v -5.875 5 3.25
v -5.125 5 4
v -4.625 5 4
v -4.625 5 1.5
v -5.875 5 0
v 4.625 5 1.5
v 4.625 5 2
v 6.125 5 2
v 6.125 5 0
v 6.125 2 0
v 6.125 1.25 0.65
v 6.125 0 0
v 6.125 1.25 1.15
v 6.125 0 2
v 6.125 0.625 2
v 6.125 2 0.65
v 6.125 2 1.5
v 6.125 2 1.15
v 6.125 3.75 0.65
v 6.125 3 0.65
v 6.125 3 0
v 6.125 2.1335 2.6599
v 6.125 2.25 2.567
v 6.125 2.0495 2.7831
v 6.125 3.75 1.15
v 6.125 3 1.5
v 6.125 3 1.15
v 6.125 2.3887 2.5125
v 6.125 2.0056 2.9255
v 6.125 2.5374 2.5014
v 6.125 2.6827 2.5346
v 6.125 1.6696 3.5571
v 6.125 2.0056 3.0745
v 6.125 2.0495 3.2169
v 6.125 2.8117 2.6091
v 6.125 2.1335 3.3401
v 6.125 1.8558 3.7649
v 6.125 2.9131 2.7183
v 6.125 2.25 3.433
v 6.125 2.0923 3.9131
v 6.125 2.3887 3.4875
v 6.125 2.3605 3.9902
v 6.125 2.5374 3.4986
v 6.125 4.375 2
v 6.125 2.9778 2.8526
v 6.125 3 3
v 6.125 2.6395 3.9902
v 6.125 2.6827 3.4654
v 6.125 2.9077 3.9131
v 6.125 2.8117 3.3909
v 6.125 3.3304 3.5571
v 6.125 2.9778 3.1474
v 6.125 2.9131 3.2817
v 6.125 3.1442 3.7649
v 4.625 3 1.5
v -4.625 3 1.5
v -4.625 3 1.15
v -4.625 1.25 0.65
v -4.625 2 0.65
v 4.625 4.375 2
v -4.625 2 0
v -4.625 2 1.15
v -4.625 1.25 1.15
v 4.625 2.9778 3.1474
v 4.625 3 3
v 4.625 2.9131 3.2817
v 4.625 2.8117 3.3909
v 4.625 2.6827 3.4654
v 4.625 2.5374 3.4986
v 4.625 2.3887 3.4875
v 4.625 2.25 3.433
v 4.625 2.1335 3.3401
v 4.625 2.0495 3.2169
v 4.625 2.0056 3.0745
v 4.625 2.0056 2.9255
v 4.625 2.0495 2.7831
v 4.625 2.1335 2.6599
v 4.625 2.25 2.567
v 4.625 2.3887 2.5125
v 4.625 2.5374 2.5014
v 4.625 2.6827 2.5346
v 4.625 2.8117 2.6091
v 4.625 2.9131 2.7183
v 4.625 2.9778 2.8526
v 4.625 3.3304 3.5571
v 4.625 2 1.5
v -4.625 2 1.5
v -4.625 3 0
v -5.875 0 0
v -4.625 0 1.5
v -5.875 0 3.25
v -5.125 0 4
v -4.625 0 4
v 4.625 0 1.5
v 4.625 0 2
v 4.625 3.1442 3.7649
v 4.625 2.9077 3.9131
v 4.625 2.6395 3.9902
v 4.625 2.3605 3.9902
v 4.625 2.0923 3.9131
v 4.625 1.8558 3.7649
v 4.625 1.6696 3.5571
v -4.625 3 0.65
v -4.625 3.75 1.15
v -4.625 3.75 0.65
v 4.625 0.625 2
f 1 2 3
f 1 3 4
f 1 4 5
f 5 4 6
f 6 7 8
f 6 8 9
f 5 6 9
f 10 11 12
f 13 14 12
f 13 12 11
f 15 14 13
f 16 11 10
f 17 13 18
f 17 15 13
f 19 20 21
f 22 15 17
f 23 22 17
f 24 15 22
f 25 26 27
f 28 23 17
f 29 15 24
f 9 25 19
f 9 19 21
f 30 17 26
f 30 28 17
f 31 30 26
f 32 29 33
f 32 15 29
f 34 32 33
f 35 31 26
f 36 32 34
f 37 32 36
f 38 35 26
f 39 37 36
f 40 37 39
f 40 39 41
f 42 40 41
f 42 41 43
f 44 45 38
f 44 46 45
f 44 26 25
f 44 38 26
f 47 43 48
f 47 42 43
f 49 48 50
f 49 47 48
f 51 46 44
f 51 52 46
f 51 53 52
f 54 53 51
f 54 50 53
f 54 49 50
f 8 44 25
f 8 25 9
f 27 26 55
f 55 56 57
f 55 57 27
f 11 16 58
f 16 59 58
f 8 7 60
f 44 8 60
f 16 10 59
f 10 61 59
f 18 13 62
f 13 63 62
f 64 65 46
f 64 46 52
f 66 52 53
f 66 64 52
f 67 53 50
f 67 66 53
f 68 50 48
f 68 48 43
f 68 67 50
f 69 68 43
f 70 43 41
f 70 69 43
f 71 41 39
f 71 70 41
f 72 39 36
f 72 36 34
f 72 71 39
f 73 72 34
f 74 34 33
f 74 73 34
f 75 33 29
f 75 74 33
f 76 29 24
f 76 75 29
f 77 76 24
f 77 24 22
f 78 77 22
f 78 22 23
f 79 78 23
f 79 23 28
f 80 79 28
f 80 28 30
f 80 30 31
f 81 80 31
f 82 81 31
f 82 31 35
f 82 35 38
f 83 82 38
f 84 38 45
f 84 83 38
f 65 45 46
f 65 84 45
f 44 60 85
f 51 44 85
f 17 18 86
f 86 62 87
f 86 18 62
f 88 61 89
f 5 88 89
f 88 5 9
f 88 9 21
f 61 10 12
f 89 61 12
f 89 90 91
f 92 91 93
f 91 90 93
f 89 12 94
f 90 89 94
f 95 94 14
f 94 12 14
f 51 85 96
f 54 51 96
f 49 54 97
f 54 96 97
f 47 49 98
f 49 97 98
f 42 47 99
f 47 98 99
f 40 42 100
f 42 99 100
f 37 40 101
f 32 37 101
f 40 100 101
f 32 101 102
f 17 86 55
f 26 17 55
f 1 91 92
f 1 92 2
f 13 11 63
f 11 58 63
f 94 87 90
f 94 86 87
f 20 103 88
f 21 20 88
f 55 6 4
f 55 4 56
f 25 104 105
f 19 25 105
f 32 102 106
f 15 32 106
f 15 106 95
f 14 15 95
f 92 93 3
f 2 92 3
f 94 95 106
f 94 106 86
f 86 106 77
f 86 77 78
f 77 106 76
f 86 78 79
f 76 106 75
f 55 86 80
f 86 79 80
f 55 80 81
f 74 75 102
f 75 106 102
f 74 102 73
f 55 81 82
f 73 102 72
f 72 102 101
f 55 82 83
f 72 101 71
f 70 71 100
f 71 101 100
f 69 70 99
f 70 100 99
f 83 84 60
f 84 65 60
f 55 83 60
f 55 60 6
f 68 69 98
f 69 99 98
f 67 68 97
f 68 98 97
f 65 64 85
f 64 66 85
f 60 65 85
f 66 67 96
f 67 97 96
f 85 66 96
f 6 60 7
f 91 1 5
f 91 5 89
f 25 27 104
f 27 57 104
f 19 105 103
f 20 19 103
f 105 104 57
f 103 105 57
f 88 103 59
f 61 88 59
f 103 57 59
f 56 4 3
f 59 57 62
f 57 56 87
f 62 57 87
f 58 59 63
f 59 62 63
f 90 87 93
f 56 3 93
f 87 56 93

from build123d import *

# Parameters (mm, degrees)
F1_DEPTH = 4.625
F2_R     = 0.5
F3_DEPTH = 1.5
F5_DEPTH = 1.25
F6_SIZE2 = 0.75
F6_SIZE  = 0.75


with BuildPart() as f1:
    # F0 (on Right) → F1 (new body, symmetric)
    with BuildSketch(Plane.YZ):
        Polygon((0, 1.5), (0, 0), (2, 0), (2, 0.65), (1.25, 0.65), (1.25, 1.15), (2, 1.15), (2, 1.5), align=None)
    extrude(amount=F1_DEPTH, both=True)



with BuildPart() as f1b:
    # F0 (on Right) → F1, piece 2 (new body, symmetric)
    with BuildSketch(Plane.YZ):
        Polygon((3, 0.65), (3, 0), (5, 0), (5, 1.5), (3, 1.5), (3, 1.15), (3.75, 1.15), (3.75, 0.65), align=None)
    extrude(amount=F1_DEPTH, both=True)


with BuildPart() as f1_1:
    add(f1.part)

    add(f1b.part)  # F3 merges F1b
    # F2 (on face) → F3 (join)
    with BuildSketch(Plane.YZ.offset(4.625)):
        with BuildLine():
            Line((0, 2), (0, 1.5))
            Line((0, 1.5), (2, 1.5))
            Line((2, 1.5), (3, 1.5))
            Line((3, 1.5), (3, 1.15))
            Line((3, 1.15), (3.75, 1.15))
            Line((3.75, 1.15), (3.75, 0.65))
            Line((3.75, 0.65), (3, 0.65))
            Line((3, 0.65), (3, 0))
            Line((3, 0), (5, 0))
            Line((5, 0), (5, 2))
            Line((5, 2), (4.375, 2))
            Line((4.375, 2), (3.330449827, 3.5570934256))
            ThreePointArc((3.330449827, 3.5570934256), (2.5, 4), (1.669550173, 3.5570934256))
            Line((1.669550173, 3.5570934256), (0.625, 2))
            Line((0.625, 2), (0, 2))
        make_face()
        with Locations((2.5, 3)):
            Circle(F2_R, mode=Mode.SUBTRACT)
        Polygon((0, 1.5), (0, 0), (2, 0), (2, 0.65), (1.25, 0.65), (1.25, 1.15), (2, 1.15), (2, 1.5), align=None)
    extrude(amount=F3_DEPTH)

    # F4 (on face) → F5 (join)
    with BuildSketch(Plane(origin=(-4.625, 0, 0), x_dir=(0, -1, 0), z_dir=(-1, 0, 0))):
        Polygon((-5, 1.5), (-5, 0), (0, 0), (0, 4), (-5, 4), align=None)
    extrude(amount=F5_DEPTH)

    # F6
    f6_edges = [f1_1.edges().sort_by_distance(p)[0] for p in [
        (-5.875, 2.5, 4),
    ]]
    chamfer(f6_edges, length=F6_SIZE, length2=F6_SIZE2)


solid = f1_1.part
